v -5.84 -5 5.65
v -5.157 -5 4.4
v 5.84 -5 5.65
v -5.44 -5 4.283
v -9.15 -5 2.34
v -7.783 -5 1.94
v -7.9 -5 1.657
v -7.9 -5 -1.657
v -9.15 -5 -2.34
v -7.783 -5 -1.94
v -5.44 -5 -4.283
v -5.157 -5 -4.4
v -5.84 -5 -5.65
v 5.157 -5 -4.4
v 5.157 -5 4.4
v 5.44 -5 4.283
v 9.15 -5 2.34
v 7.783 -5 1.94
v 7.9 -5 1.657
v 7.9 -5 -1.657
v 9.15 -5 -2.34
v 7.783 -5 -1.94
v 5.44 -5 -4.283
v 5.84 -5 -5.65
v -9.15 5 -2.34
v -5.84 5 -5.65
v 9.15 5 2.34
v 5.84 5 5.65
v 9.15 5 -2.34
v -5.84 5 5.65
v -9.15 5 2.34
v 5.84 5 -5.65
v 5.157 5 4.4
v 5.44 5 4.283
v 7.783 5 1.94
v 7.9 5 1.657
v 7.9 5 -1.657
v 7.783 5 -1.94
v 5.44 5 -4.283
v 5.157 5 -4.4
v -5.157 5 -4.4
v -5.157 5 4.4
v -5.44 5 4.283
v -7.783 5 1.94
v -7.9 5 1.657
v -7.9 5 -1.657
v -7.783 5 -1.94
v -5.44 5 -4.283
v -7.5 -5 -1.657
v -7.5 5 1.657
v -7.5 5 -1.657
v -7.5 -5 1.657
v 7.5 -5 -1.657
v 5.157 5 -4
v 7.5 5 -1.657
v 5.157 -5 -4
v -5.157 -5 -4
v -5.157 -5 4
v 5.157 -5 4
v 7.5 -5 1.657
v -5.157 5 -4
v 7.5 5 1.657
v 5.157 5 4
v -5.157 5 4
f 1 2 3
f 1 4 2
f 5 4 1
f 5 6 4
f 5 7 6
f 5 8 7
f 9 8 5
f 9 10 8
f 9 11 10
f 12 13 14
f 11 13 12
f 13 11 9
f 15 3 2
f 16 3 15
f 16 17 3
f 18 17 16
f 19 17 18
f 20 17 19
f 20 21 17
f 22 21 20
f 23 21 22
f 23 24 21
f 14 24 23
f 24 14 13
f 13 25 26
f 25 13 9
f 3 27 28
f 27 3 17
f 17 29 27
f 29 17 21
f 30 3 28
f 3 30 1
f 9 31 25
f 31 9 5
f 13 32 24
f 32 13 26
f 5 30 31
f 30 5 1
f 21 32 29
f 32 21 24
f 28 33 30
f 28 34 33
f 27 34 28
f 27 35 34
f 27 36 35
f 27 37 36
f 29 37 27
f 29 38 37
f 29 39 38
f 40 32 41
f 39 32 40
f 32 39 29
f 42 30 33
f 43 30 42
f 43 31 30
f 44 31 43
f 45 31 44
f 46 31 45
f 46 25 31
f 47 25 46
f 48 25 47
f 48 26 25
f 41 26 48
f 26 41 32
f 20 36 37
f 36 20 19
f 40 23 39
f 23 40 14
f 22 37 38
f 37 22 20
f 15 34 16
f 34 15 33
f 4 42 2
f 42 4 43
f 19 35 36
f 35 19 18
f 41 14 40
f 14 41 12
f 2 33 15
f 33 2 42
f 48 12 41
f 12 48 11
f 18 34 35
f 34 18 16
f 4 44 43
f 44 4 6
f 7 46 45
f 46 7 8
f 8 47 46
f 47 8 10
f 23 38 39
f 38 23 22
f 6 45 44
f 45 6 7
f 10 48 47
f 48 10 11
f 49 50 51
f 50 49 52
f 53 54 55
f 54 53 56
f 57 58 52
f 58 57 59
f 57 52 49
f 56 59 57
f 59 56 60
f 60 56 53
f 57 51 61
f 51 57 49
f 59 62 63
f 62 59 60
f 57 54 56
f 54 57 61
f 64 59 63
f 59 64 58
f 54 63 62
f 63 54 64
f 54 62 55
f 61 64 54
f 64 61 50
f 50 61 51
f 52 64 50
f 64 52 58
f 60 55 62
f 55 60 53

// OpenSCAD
*difference() {
  cube([6 + (3 * sqrt(2)), 9.75, 3], center = true);
  
  translate([-5, 0, 0])
    rotate([0, 45, 0])
      cube([3, 12, 3], center = true);

  translate([5, 0, 0])
    rotate([0, 45, 0])
      cube([3, 12, 3], center = true);
}

*difference() {
  union() {
    translate([0, 0, -2.24])
      cube([12, 10, 1], center = true);
    
    translate([-5.32, 0, 0])
      rotate([0, 45, 0])
        cube([3, 10, 3], center = true);

    translate([5.32, 0, 0])
      rotate([0, 45, 0])
        cube([3, 10, 3], center = true);
    
    
    translate([0, 5.25, 0])
      cube([10.6, .5, 5.4], center = true);
  }
 
  translate([-7.3, 0, 0])
    cube([4, 11, 10], center = true);
  
  translate([7.3, 0, 0])
    cube([4, 11, 10], center = true);
  
  translate([0, 0, 3])
    cube([14, 12, 3], center = true);
}


module slideShape(width, length, height, diameter, center = false) {
  txa = center ? width / -2 : width;
  tya = center ? 0 : height / 2;
  
  txb = center ? width / 2 : 0;
  tyb = center ? 0 : height / 2;
  
  sideLength = sqrt((diameter * diameter) - (height * height));
  sideShift = (sideLength * sqrt(2) / 2) + (sideLength / 2);
  
  square([width - (sideShift * 2), height], center = center);
      
  translate([txa + sideShift, tya, 0])
    rotate([0, 0, 22.5])
      circle(d = diameter, $fn = 8);

  translate([txb - sideShift, tyb, 0])
    rotate([0, 0, 22.5])
      circle(d = diameter, $fn = 8); 
}

module slide(size, center = false, slices = 1, outer = false) {
  width = size[0];
  length = size[1];
  height = size[2];
  diameter = height / sin(67.5);
  offset = outer ? 0.4 : 0;
  
  rotate([90, 0, 0])
    linear_extrude(length, center = center, slices = slices) {
      offset(offset)
        slideShape(width, length, height, diameter, center);
    }
}


slide([15, 10, 8], center = true);

difference() {
    slide([18.3, 10, 11.3], center = true);
    slide([15, 12, 8], center = true, outer = true);
  

}
